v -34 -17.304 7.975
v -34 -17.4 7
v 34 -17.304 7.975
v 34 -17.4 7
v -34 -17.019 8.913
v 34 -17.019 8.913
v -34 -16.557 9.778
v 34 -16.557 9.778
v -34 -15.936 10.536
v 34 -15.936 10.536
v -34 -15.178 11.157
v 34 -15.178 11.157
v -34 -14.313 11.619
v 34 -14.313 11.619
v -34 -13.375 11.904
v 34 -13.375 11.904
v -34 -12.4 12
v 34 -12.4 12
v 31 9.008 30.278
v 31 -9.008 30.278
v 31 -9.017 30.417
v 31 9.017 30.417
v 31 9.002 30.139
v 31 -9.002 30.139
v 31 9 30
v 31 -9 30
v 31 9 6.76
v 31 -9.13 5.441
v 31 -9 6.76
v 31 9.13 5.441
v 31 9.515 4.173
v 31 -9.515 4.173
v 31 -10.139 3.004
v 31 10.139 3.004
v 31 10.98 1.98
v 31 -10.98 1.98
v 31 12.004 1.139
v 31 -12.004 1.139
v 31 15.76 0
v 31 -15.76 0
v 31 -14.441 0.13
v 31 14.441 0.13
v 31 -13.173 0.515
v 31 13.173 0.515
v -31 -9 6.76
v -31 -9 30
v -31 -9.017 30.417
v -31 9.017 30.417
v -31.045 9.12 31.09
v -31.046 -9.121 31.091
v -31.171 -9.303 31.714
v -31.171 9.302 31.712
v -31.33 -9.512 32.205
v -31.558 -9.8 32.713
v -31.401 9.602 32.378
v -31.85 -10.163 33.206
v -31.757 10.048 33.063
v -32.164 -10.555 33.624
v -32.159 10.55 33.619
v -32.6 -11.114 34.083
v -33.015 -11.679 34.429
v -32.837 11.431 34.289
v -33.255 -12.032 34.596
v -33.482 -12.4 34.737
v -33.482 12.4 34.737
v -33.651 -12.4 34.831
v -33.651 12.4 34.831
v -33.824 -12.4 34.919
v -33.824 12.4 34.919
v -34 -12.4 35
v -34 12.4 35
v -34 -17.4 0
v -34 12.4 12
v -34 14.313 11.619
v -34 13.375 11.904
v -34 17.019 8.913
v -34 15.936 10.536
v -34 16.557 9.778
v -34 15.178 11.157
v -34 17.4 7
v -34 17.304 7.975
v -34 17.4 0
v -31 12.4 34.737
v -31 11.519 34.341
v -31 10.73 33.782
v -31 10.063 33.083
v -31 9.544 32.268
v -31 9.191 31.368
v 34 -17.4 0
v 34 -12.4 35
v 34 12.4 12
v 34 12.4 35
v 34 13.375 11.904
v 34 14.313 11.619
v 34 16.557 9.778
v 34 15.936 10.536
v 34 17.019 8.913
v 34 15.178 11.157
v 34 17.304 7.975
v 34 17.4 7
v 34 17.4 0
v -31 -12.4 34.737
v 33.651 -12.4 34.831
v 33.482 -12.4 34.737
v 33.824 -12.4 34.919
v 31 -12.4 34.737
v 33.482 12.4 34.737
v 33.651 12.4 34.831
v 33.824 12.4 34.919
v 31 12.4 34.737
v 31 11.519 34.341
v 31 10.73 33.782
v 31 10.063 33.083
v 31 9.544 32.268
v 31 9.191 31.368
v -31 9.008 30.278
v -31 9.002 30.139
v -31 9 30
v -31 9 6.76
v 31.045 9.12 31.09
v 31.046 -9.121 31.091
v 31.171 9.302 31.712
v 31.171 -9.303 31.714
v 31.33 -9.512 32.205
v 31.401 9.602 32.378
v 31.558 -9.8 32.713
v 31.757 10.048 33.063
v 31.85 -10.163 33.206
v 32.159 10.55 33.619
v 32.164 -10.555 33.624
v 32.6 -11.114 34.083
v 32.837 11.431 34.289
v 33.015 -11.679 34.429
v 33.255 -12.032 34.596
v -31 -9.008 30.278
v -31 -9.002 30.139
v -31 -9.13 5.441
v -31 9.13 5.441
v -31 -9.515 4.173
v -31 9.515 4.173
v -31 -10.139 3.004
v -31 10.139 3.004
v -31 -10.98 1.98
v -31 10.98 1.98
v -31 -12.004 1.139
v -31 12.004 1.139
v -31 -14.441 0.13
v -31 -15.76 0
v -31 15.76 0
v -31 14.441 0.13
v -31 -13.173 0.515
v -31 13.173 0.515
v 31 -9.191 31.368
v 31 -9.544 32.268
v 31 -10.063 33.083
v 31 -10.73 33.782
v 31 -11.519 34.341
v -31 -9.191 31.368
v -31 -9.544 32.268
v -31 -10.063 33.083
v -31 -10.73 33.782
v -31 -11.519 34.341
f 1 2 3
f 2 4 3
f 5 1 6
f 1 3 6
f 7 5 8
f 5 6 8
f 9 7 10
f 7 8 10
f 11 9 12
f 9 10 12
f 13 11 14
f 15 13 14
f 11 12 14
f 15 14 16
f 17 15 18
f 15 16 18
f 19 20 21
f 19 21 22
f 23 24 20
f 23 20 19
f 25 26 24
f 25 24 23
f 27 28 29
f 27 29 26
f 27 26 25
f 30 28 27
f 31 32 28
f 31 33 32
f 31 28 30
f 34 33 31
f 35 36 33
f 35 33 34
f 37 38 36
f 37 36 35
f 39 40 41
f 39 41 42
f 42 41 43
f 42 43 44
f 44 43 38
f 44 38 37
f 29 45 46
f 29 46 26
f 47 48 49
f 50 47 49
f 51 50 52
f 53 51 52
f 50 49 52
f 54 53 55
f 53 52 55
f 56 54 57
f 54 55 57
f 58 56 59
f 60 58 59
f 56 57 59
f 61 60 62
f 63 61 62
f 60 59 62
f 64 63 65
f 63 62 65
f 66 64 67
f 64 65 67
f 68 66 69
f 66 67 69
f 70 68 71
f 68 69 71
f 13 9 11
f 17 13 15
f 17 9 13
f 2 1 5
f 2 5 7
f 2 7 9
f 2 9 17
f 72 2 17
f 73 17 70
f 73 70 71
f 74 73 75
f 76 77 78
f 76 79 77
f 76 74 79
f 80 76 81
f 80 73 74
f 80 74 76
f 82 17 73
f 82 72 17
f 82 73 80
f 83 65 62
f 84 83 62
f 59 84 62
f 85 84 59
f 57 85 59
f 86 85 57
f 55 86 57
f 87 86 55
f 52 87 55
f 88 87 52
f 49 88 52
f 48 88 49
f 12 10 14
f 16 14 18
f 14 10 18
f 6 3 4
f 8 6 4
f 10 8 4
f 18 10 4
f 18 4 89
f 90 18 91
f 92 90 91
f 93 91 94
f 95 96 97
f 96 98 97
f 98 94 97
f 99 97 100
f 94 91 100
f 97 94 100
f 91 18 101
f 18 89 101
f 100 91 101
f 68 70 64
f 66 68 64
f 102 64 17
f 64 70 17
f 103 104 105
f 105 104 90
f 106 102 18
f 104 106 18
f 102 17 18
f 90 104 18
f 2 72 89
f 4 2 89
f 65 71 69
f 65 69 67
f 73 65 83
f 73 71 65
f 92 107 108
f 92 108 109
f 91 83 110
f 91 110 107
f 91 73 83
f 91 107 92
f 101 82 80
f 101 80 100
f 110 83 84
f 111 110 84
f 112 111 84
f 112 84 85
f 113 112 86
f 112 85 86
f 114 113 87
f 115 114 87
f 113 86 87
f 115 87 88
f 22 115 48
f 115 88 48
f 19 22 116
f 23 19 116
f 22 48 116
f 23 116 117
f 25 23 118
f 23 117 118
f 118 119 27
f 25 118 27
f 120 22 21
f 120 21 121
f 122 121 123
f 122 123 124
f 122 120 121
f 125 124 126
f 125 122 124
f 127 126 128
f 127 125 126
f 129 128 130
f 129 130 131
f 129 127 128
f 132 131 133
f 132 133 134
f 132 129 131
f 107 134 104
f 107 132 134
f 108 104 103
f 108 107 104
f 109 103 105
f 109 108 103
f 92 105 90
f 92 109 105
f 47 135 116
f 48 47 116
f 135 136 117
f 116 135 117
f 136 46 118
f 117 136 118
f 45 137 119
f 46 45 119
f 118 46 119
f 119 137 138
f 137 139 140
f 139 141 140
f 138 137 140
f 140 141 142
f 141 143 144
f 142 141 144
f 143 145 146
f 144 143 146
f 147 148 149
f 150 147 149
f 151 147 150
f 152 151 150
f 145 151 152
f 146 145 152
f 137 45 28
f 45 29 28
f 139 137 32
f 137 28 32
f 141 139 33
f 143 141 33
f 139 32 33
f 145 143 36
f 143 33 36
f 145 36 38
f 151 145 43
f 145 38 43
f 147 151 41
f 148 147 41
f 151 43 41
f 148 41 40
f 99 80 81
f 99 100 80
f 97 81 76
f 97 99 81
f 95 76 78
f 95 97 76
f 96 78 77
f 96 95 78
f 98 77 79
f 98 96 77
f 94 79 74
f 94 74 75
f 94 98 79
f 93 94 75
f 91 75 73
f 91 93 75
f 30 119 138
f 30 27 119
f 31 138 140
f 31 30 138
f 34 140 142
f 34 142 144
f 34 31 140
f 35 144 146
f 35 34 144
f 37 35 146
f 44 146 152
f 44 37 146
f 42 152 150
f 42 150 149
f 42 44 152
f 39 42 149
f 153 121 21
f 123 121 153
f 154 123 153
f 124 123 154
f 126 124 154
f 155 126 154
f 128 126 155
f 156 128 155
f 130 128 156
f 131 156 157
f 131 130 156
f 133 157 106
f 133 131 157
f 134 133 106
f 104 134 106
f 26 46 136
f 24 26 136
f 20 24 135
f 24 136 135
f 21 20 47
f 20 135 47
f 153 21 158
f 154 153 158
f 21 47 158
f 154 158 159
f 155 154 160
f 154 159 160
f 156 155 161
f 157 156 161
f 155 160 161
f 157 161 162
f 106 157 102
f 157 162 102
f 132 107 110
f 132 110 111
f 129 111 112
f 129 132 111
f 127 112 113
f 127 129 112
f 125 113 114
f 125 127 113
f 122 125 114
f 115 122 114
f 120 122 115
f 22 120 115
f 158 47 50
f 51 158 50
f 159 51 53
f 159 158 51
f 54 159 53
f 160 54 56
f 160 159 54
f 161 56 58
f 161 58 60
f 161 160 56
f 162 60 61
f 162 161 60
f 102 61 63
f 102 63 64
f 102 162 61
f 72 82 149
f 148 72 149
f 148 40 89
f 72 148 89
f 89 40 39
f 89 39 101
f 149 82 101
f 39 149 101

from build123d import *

# Parameters (mm, degrees)
F0_W         = 68
F0_H         = 24.8
F0_W_2       = 62
F0_H_2       = 18
F1_DEPTH     = 35
F0_H_3       = 5
F2_DEPTH     = 12
F3_R         = 6.7597979746
F4_R         = 6.7597979746
F5_R         = 4.99999
F6_R         = 4.99999
F7_T1_DEPTH  = 62
F8_T1_DEPTH  = 62
F9_T4_DEPTH  = 47.7128784748
F9_S5_R      = 5.0000000001
F9_T6_DEPTH  = 26
F9_S7_R      = 5.0000000001
F9_T8_DEPTH  = 26
F10_T4_DEPTH = 47.7128784748
F10_S5_R     = 5.0000000001
F10_T6_DEPTH = 26
F10_S7_R     = 5.0000000001
F10_T8_DEPTH = 26


# Not quite as in the source:
# - a fillet or chamfer that OpenCascade refuses, or shapes differently, is made with other operations: its cross-section is extruded or revolved along the edge and cut away or added
# - a fillet or chamfer is up to 0.001 mm smaller than in the source, because OpenCascade refuses the exact size


with BuildPart() as f1:
    # F0 (on Top) → F1 (new body)
    with BuildSketch(Plane.XY):
        Rectangle(F0_W, F0_H)
        Rectangle(F0_W_2, F0_H_2, mode=Mode.SUBTRACT)
    extrude(amount=F1_DEPTH)

    # F0 (on Top) → F2 (join)
    with BuildSketch(Plane.XY):
        with Locations((0, 14.9)):
            Rectangle(F0_W, F0_H_3)
        with Locations((0, -14.9)):
            Rectangle(F0_W, F0_H_3)
    extrude(amount=F2_DEPTH)

    # F3
    f3_edges = [f1.edges().sort_by_distance(p)[0] for p in [
        (0, 9, 0),
    ]]
    fillet(f3_edges, radius=F3_R)

    # F4
    f4_edges = [f1.edges().sort_by_distance(p)[0] for p in [
        (0, -9, 0),
    ]]
    fillet(f4_edges, radius=F4_R)

    # F5 (radius 5 in the source; OpenCascade refuses exactly that, so slightly less here)
    f5_edges = [f1.edges().sort_by_distance(p)[0] for p in [
        (0, 17.4, 12),
    ]]
    fillet(f5_edges, radius=F5_R)

    # F6 (radius 5 in the source; OpenCascade refuses exactly that, so slightly less here)
    f6_edges = [f1.edges().sort_by_distance(p)[0] for p in [
        (0, -17.4, 12),
    ]]
    fillet(f6_edges, radius=F6_R)

    # F7: fillet of radius 5 on 1 edges, made by hand

    # F7_s2 → F7_t1 (cut)
    with BuildSketch(Plane.YZ.offset(-31)):
        with BuildLine():
            ThreePointArc((14, 35), (10.4644660941, 33.5355339059), (9, 30))
            Line((9, 30), (9, 35))
            Line((9, 35), (14, 35))
        make_face()
    extrude(amount=F7_T1_DEPTH, mode=Mode.SUBTRACT)

    # F8: fillet of radius 5 on 1 edges, made by hand

    # F8_s2 → F8_t1 (cut)
    with BuildSketch(Plane.YZ.offset(-31)):
        with BuildLine():
            ThreePointArc((-9, 30), (-10.4644660941, 33.5355339059), (-14, 35))
            Line((-14, 35), (-9, 35))
            Line((-9, 35), (-9, 30))
        make_face()
    extrude(amount=F8_T1_DEPTH, mode=Mode.SUBTRACT)

    # F9: fillet of radius 5 on 1 edges, made by hand


with BuildPart() as f9_tool2:
    # F9_s3 → F9_t4 (new body)
    with BuildSketch(Plane.XZ.offset(-23.8564392374)):
        with BuildLine():
            ThreePointArc((-31, 30.417424305), (-31.8166998673, 33.1560370926), (-34, 35))
            Line((-34, 35), (-31, 35))
            Line((-31, 35), (-31, 30.417424305))
        make_face()
    extrude(amount=F9_T4_DEPTH)

    # F9_s5 → F9_t6 (cut, symmetric)
    with BuildSketch(Plane.YZ.offset(-32.5)):
        with Locations((-14.0000000001, 29.9999999999)):
            Circle(F9_S5_R)
    extrude(amount=F9_T6_DEPTH, both=True, mode=Mode.SUBTRACT)

    # F9_s7 → F9_t8 (cut, symmetric)
    with BuildSketch(Plane.YZ.offset(-32.5)):
        with Locations((14.0000000001, 29.9999999999)):
            Circle(F9_S7_R)
    extrude(amount=F9_T8_DEPTH, both=True, mode=Mode.SUBTRACT)


with BuildPart() as f1_1:
    add(f1.part)

    # F9_t1: cut F9_tool2
    add(f9_tool2.part, mode=Mode.SUBTRACT)

    # F10: fillet of radius 5 on 1 edges, made by hand


with BuildPart() as f10_tool2:
    # F10_s3 → F10_t4 (new body)
    with BuildSketch(Plane.XZ.offset(-23.8564392374)):
        with BuildLine():
            ThreePointArc((31, 30.417424305), (31.8166998673, 33.1560370926), (34, 35))
            Line((34, 35), (31, 35))
            Line((31, 35), (31, 30.417424305))
        make_face()
    extrude(amount=F10_T4_DEPTH)

    # F10_s5 → F10_t6 (cut, symmetric)
    with BuildSketch(Plane.YZ.offset(32.5)):
        with Locations((-14.0000000001, 29.9999999999)):
            Circle(F10_S5_R)
    extrude(amount=F10_T6_DEPTH, both=True, mode=Mode.SUBTRACT)

    # F10_s7 → F10_t8 (cut, symmetric)
    with BuildSketch(Plane.YZ.offset(32.5)):
        with Locations((14.0000000001, 29.9999999999)):
            Circle(F10_S7_R)
    extrude(amount=F10_T8_DEPTH, both=True, mode=Mode.SUBTRACT)


with BuildPart() as f1_2:
    add(f1_1.part)

    # F10_t1: cut F10_tool2
    add(f10_tool2.part, mode=Mode.SUBTRACT)


solid = f1_2.part
